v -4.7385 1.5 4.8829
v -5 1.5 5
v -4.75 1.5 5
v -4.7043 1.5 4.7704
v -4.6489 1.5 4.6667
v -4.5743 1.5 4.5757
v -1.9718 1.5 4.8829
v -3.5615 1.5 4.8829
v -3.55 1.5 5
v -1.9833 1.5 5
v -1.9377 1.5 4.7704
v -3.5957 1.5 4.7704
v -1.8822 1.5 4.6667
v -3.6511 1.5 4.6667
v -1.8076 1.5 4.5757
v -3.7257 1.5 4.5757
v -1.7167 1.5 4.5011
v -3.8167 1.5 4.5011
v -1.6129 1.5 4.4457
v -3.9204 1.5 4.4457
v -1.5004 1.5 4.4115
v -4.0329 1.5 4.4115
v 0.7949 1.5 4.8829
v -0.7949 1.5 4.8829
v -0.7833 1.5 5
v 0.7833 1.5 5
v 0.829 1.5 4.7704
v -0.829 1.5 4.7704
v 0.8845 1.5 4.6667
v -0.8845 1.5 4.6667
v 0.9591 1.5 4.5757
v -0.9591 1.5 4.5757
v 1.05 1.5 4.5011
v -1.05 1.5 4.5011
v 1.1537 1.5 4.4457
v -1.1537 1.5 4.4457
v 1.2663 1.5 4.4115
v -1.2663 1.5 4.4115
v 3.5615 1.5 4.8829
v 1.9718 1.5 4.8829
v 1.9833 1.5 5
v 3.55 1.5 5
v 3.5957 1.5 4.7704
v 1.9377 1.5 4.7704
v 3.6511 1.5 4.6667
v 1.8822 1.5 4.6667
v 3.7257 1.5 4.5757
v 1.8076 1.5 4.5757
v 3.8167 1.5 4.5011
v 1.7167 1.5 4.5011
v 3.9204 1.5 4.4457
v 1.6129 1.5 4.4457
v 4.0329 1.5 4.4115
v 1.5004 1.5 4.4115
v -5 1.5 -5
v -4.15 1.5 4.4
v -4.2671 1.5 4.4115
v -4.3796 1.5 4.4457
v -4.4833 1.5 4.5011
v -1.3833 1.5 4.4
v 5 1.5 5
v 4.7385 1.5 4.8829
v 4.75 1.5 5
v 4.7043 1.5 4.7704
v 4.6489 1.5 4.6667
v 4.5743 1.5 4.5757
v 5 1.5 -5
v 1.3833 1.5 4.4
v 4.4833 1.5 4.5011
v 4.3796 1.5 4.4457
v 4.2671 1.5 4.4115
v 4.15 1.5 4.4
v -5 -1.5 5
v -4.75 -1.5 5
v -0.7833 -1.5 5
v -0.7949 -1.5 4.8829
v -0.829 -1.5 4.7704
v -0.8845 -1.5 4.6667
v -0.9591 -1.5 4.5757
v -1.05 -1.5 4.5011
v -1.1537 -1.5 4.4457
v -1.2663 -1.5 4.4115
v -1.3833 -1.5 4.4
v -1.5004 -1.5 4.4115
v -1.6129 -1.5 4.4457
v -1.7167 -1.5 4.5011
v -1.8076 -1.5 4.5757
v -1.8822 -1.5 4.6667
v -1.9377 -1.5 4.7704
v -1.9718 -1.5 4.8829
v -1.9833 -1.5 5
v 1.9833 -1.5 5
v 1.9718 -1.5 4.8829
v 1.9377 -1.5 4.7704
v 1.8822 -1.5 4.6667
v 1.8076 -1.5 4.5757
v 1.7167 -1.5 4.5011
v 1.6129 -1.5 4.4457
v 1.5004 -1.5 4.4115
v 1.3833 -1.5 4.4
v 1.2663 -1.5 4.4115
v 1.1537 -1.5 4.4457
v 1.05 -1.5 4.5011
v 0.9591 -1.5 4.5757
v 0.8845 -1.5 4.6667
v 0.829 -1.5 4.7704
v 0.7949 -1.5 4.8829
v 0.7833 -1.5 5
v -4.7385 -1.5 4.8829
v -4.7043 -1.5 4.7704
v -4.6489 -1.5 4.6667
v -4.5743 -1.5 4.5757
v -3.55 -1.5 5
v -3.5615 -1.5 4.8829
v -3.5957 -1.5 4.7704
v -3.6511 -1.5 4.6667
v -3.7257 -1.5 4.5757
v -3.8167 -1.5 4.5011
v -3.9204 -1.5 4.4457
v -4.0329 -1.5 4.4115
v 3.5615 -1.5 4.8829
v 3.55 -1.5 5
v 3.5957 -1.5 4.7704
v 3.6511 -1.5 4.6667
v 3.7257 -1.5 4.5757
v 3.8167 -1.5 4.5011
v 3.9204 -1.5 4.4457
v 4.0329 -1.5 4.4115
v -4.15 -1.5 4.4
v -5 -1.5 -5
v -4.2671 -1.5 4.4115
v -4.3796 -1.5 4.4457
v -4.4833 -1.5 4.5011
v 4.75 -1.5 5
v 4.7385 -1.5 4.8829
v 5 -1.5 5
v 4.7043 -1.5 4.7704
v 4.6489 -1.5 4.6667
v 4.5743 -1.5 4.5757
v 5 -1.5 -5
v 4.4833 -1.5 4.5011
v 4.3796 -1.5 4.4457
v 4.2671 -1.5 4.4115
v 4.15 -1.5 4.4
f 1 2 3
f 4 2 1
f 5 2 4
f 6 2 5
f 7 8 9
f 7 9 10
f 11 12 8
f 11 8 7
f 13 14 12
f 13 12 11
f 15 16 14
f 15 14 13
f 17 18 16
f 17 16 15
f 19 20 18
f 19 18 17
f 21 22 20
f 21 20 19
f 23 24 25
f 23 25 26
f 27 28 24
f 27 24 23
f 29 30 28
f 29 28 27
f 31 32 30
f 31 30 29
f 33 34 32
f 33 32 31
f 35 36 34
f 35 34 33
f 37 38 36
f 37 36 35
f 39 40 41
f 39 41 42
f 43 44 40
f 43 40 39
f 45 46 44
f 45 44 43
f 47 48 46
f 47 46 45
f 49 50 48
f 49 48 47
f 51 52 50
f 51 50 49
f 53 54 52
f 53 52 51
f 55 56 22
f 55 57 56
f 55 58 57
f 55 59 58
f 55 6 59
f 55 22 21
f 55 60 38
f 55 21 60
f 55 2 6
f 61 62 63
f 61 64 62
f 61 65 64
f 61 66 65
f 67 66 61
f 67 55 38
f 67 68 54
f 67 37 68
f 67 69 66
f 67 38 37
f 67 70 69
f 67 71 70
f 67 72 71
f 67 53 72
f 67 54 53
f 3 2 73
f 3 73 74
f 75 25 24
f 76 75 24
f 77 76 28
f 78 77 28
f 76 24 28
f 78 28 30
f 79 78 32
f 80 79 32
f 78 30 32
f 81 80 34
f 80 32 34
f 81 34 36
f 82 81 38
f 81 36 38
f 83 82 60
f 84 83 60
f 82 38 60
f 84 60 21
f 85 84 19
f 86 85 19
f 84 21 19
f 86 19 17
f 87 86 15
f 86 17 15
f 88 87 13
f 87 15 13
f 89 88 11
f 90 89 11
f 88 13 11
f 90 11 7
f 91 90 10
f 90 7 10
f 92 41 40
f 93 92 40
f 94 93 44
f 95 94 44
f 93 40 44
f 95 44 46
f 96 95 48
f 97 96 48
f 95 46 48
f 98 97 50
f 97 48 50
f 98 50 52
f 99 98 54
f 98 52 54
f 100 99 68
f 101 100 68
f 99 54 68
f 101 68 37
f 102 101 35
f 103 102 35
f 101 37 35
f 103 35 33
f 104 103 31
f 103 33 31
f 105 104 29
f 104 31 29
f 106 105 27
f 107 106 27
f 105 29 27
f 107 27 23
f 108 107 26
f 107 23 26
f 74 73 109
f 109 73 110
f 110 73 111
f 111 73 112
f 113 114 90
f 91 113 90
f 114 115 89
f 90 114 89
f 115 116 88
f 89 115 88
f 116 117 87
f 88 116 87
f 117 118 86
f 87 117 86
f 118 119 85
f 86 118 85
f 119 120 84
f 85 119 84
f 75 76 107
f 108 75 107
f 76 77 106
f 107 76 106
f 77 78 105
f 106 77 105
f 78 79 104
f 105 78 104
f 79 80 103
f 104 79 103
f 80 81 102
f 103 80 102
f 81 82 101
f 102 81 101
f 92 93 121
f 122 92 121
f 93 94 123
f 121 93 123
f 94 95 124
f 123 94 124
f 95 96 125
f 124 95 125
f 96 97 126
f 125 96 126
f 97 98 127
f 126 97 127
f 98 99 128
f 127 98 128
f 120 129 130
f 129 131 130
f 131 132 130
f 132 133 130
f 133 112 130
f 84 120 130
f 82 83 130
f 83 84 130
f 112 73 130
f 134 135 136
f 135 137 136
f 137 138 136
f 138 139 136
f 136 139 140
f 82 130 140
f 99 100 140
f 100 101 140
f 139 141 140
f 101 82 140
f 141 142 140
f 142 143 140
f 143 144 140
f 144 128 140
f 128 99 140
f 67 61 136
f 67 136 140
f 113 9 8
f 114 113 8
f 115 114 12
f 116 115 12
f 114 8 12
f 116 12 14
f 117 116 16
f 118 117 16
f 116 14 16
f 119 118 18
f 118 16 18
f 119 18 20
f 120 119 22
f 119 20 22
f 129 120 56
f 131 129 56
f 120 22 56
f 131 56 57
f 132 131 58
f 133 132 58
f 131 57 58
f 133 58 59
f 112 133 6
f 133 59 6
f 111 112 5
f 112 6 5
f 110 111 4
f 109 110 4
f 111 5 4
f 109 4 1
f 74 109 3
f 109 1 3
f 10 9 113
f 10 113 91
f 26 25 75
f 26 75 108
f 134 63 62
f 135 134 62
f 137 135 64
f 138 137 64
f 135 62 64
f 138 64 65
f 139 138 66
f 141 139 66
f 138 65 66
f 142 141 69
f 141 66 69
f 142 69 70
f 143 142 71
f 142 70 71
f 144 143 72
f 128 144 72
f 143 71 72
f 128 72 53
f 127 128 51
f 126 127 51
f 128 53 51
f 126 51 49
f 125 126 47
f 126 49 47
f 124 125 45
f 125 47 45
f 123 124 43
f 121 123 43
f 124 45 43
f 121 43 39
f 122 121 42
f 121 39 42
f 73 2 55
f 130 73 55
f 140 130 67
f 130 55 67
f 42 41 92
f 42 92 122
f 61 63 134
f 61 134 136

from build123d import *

# Parameters (mm, degrees)
SKETCH1_W           = 10
SKETCH1_H           = 10
BOSS_EXTRUDE1_DEPTH = 1.5
CUT_EXTRUDE1_DEPTH  = 1.5
LPATTERN1_COUNT     = 4
LPATTERN1_PITCH     = 2.766666667


with BuildPart() as part:
    # Sketch1 → Boss-Extrude1 (new body, symmetric)
    with BuildSketch(Plane(origin=(0, 0, 0), x_dir=(1, 0, 0), z_dir=(0, 1, 0))):
        Rectangle(SKETCH1_W, SKETCH1_H)
    extrude(amount=BOSS_EXTRUDE1_DEPTH, both=True)

    # Sketch2 → Cut-Extrude1 (cut, symmetric)
    with BuildSketch(Plane(origin=(0, 0, 0), x_dir=(1, 0, 0), z_dir=(0, 1, 0))):
        with BuildLine():
            Line((-4.75, -5), (-3.55, -5))
            ThreePointArc((-3.55, -5), (-4.15, -4.4), (-4.75, -5))
        make_face()
    cut_extrude1 = extrude(amount=CUT_EXTRUDE1_DEPTH, both=True, mode=Mode.SUBTRACT)

    # LPattern1: Cut-Extrude1 ×4
    with Locations(*[(i * LPATTERN1_PITCH, 0, 0) for i in range(1, LPATTERN1_COUNT)]):
        add(cut_extrude1, mode=Mode.SUBTRACT)


solid = part.part
